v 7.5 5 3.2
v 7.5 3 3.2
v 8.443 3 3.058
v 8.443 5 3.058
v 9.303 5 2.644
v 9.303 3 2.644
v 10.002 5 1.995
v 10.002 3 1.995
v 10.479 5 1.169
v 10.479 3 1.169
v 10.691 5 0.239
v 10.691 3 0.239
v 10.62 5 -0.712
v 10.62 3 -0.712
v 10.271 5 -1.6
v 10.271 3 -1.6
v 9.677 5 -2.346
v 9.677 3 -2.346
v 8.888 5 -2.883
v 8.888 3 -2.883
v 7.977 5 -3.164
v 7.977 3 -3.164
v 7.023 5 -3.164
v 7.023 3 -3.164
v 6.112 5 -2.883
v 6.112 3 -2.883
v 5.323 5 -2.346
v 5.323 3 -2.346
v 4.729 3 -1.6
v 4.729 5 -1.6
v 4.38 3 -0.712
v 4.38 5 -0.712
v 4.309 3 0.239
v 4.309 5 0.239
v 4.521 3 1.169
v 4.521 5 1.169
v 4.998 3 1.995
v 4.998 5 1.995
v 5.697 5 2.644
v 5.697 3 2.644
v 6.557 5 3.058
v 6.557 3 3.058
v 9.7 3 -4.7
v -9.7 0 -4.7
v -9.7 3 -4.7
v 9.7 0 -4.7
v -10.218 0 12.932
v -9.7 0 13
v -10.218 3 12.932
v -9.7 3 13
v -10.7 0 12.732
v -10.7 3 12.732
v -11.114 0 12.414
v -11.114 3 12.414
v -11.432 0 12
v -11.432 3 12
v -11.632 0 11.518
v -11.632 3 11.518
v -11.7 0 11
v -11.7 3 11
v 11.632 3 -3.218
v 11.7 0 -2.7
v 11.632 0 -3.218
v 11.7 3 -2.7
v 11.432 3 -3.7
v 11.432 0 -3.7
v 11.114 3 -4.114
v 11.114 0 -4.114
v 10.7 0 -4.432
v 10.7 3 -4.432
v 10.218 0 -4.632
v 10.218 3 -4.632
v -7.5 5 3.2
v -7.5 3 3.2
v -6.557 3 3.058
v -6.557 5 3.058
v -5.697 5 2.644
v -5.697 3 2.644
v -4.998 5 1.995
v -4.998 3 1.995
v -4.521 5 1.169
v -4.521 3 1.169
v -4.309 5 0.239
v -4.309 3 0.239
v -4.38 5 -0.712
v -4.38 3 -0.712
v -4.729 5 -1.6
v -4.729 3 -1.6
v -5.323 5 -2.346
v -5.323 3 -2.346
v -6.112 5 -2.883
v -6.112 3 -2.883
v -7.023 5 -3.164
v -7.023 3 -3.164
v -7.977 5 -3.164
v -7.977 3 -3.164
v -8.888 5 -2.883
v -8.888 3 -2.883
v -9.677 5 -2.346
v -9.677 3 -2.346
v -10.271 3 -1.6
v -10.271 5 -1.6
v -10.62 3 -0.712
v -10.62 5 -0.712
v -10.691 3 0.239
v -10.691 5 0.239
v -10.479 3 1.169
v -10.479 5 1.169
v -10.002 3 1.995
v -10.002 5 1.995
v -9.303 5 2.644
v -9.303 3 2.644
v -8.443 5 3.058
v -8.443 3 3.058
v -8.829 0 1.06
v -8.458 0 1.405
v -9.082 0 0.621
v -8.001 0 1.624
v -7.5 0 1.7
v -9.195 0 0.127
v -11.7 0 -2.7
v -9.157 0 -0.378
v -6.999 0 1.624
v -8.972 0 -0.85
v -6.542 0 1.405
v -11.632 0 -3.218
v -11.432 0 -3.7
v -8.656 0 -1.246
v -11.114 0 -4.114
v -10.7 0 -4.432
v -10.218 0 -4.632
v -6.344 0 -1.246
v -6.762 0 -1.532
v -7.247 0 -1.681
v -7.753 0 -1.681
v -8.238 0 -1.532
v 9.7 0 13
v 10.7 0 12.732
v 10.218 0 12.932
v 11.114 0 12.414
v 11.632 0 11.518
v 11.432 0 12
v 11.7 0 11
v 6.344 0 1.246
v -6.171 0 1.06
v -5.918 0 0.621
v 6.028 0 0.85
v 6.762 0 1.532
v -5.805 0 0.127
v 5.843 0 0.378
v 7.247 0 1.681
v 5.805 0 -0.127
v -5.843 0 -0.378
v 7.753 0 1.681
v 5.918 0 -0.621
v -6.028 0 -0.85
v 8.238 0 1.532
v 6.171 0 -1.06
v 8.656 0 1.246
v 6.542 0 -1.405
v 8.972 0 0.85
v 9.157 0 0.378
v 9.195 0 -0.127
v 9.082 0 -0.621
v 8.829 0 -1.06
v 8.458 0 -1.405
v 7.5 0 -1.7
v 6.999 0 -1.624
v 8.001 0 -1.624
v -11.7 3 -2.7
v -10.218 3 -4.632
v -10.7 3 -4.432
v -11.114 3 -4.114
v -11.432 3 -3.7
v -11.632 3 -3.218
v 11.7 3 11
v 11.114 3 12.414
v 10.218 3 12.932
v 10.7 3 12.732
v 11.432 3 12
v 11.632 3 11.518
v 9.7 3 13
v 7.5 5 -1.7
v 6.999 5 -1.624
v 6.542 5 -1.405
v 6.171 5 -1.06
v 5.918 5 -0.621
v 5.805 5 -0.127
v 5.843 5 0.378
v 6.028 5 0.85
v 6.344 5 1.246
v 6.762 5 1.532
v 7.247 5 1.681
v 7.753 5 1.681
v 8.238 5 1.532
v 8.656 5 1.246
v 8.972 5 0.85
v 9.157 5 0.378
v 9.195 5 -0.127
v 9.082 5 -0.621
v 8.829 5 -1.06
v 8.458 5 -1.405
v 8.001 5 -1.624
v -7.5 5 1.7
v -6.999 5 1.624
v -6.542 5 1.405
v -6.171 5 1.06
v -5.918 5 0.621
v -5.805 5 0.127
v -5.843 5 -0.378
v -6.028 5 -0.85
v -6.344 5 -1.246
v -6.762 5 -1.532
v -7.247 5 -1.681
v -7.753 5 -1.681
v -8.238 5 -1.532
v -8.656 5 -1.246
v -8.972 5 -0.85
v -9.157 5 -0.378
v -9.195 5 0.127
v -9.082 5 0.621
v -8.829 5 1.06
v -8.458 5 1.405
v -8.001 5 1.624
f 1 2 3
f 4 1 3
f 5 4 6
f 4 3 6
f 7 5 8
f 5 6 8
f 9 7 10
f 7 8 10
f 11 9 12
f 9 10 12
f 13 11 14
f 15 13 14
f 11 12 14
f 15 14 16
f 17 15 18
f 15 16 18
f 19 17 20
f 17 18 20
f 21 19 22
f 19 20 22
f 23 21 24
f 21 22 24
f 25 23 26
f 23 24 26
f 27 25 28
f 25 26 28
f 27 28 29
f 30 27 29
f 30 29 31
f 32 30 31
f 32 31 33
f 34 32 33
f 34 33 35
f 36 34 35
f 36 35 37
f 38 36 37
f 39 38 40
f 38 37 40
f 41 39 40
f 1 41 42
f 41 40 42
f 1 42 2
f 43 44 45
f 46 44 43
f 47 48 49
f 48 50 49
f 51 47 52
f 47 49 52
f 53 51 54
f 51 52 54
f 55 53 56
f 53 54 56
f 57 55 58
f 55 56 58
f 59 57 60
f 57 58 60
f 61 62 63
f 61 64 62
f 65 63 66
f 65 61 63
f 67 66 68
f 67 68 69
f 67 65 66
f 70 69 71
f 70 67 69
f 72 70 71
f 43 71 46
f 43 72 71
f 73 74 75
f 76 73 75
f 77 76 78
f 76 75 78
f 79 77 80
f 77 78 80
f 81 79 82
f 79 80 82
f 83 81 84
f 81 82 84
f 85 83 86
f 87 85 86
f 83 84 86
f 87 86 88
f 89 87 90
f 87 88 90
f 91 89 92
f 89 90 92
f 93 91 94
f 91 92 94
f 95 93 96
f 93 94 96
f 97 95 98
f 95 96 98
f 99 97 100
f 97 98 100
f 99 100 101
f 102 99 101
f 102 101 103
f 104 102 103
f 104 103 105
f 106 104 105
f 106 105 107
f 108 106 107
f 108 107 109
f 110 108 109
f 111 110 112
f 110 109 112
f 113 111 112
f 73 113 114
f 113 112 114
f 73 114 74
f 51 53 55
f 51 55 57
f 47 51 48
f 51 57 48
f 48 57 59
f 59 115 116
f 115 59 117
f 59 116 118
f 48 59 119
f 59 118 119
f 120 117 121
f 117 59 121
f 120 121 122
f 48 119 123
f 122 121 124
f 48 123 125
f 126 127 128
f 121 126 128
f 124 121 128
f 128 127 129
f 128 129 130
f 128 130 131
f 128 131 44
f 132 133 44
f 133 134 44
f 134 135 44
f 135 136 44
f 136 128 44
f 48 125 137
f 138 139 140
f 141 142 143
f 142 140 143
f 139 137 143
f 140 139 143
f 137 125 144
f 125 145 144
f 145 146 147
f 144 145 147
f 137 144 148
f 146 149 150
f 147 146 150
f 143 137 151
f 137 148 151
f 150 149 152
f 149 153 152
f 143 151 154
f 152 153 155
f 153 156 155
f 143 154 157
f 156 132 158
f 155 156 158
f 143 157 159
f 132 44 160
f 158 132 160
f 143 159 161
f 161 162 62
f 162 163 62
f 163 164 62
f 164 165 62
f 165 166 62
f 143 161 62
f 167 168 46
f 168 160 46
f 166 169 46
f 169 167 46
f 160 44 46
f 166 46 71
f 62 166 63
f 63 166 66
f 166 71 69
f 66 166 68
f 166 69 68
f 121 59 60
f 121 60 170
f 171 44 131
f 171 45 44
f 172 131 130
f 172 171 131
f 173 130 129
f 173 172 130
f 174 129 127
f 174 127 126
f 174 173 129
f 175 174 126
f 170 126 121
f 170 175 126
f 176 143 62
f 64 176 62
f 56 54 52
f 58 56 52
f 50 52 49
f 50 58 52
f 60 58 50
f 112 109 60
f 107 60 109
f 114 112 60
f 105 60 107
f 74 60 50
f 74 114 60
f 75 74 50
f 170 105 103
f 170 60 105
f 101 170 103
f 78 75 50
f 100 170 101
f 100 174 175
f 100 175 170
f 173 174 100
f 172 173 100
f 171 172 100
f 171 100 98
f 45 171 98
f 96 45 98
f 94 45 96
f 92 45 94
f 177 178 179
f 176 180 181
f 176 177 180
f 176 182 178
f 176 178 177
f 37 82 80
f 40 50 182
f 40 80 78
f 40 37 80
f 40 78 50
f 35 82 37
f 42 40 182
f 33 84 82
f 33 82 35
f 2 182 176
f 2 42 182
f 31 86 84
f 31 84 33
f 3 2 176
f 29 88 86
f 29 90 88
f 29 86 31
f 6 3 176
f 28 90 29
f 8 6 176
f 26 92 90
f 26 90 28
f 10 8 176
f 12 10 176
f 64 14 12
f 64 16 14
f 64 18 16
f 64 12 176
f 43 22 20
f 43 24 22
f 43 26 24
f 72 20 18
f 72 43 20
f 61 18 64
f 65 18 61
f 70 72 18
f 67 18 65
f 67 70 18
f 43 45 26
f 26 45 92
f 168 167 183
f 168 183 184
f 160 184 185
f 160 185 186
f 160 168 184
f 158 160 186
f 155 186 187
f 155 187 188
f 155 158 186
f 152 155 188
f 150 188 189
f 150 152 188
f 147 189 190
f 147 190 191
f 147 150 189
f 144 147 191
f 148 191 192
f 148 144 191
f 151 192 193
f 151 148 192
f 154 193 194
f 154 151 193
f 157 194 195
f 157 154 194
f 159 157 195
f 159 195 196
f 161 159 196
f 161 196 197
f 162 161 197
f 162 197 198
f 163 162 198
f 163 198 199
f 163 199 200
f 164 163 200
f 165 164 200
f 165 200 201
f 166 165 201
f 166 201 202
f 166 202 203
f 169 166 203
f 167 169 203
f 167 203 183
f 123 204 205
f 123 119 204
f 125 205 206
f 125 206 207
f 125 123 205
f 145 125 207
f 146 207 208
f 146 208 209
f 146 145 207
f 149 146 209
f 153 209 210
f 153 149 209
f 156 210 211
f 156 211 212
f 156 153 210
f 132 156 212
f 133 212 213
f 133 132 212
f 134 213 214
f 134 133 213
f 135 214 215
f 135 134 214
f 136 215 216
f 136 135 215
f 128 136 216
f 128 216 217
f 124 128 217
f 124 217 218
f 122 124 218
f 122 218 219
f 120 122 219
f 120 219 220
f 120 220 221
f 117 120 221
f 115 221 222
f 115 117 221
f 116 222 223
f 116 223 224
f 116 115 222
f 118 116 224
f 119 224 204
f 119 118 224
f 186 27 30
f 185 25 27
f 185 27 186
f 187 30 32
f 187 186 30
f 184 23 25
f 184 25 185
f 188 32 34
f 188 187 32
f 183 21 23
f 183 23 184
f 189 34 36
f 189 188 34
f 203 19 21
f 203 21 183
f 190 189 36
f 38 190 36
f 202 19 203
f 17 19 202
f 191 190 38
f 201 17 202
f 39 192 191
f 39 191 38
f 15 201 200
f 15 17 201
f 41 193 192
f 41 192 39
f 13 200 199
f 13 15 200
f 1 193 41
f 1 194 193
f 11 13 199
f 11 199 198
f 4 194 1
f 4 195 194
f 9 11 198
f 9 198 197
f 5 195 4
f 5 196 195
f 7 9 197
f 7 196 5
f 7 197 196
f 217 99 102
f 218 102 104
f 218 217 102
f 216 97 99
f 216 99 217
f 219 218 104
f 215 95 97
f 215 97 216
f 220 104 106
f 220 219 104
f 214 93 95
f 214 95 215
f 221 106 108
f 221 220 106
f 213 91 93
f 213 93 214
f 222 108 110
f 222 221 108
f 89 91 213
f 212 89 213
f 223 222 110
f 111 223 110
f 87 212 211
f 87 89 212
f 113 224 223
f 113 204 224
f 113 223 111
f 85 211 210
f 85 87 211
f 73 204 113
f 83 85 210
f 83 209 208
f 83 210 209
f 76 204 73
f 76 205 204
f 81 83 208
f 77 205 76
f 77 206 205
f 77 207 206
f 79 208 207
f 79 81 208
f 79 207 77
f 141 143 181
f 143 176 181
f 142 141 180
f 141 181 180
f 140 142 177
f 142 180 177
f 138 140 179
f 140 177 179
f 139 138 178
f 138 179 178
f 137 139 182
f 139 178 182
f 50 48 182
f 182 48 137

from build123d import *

# Parameters (mm, degrees)
SKETCH_1_W      = 23.4
SKETCH_1_H      = 17.7
SKETCH_1_R      = 1.7
EXTRUDE_1_DEPTH = 3
SKETCH_2_R      = 3.2
SKETCH_2_R_2    = 1.7
EXTRUDE_2_DEPTH = 2
FILLET_1_R      = 2


with BuildPart() as part:
    # Эскиз1 → Бобышка-Вытянуть1 (new body)
    with BuildSketch(Plane(origin=(0, 0, 0), x_dir=(1, 0, 0), z_dir=(0, 1, 0))):
        with Locations((0, -4.15)):
            Rectangle(SKETCH_1_W, SKETCH_1_H)
        with Locations(Location((-7.5, 0, 0), (0, 0, 270))):
            Circle(SKETCH_1_R, mode=Mode.SUBTRACT)
        with Locations(Location((7.5, 0, 0), (0, 0, 90))):
            Circle(SKETCH_1_R, mode=Mode.SUBTRACT)
    extrude(amount=EXTRUDE_1_DEPTH)

    # Эскиз2 → Бобышка-Вытянуть2 (add)
    # profile 1 of 2: a face of its own
    with BuildSketch(Plane(origin=(0, 3, 0), x_dir=(1, 0, 0), z_dir=(0, 1, 0))):
        with Locations(Location((-7.5, 0, 0), (0, 0, 270))):
            Circle(SKETCH_2_R)
        with Locations(Location((-7.5, 0, 0), (0, 0, 270))):
            Circle(SKETCH_2_R_2, mode=Mode.SUBTRACT)
    # profile 2 of 2: a face of its own
    with BuildSketch(Plane(origin=(0, 3, 0), x_dir=(1, 0, 0), z_dir=(0, 1, 0))):
        with Locations(Location((7.5, 0, 0), (0, 0, 270))):
            Circle(SKETCH_2_R)
        with Locations(Location((7.5, 0, 0), (0, 0, 90))):
            Circle(SKETCH_2_R_2, mode=Mode.SUBTRACT)
    extrude(amount=EXTRUDE_2_DEPTH)

    # Скругление1
    fillet_1_edges = [part.edges().sort_by_distance(p)[0] for p in [
        (-11.7, 1.5, -4.7),
        (11.7, 1.5, -4.7),
        (11.7, 1.5, 13),
        (-11.7, 1.5, 13),
    ]]
    fillet(fillet_1_edges, radius=FILLET_1_R)


solid = part.part
